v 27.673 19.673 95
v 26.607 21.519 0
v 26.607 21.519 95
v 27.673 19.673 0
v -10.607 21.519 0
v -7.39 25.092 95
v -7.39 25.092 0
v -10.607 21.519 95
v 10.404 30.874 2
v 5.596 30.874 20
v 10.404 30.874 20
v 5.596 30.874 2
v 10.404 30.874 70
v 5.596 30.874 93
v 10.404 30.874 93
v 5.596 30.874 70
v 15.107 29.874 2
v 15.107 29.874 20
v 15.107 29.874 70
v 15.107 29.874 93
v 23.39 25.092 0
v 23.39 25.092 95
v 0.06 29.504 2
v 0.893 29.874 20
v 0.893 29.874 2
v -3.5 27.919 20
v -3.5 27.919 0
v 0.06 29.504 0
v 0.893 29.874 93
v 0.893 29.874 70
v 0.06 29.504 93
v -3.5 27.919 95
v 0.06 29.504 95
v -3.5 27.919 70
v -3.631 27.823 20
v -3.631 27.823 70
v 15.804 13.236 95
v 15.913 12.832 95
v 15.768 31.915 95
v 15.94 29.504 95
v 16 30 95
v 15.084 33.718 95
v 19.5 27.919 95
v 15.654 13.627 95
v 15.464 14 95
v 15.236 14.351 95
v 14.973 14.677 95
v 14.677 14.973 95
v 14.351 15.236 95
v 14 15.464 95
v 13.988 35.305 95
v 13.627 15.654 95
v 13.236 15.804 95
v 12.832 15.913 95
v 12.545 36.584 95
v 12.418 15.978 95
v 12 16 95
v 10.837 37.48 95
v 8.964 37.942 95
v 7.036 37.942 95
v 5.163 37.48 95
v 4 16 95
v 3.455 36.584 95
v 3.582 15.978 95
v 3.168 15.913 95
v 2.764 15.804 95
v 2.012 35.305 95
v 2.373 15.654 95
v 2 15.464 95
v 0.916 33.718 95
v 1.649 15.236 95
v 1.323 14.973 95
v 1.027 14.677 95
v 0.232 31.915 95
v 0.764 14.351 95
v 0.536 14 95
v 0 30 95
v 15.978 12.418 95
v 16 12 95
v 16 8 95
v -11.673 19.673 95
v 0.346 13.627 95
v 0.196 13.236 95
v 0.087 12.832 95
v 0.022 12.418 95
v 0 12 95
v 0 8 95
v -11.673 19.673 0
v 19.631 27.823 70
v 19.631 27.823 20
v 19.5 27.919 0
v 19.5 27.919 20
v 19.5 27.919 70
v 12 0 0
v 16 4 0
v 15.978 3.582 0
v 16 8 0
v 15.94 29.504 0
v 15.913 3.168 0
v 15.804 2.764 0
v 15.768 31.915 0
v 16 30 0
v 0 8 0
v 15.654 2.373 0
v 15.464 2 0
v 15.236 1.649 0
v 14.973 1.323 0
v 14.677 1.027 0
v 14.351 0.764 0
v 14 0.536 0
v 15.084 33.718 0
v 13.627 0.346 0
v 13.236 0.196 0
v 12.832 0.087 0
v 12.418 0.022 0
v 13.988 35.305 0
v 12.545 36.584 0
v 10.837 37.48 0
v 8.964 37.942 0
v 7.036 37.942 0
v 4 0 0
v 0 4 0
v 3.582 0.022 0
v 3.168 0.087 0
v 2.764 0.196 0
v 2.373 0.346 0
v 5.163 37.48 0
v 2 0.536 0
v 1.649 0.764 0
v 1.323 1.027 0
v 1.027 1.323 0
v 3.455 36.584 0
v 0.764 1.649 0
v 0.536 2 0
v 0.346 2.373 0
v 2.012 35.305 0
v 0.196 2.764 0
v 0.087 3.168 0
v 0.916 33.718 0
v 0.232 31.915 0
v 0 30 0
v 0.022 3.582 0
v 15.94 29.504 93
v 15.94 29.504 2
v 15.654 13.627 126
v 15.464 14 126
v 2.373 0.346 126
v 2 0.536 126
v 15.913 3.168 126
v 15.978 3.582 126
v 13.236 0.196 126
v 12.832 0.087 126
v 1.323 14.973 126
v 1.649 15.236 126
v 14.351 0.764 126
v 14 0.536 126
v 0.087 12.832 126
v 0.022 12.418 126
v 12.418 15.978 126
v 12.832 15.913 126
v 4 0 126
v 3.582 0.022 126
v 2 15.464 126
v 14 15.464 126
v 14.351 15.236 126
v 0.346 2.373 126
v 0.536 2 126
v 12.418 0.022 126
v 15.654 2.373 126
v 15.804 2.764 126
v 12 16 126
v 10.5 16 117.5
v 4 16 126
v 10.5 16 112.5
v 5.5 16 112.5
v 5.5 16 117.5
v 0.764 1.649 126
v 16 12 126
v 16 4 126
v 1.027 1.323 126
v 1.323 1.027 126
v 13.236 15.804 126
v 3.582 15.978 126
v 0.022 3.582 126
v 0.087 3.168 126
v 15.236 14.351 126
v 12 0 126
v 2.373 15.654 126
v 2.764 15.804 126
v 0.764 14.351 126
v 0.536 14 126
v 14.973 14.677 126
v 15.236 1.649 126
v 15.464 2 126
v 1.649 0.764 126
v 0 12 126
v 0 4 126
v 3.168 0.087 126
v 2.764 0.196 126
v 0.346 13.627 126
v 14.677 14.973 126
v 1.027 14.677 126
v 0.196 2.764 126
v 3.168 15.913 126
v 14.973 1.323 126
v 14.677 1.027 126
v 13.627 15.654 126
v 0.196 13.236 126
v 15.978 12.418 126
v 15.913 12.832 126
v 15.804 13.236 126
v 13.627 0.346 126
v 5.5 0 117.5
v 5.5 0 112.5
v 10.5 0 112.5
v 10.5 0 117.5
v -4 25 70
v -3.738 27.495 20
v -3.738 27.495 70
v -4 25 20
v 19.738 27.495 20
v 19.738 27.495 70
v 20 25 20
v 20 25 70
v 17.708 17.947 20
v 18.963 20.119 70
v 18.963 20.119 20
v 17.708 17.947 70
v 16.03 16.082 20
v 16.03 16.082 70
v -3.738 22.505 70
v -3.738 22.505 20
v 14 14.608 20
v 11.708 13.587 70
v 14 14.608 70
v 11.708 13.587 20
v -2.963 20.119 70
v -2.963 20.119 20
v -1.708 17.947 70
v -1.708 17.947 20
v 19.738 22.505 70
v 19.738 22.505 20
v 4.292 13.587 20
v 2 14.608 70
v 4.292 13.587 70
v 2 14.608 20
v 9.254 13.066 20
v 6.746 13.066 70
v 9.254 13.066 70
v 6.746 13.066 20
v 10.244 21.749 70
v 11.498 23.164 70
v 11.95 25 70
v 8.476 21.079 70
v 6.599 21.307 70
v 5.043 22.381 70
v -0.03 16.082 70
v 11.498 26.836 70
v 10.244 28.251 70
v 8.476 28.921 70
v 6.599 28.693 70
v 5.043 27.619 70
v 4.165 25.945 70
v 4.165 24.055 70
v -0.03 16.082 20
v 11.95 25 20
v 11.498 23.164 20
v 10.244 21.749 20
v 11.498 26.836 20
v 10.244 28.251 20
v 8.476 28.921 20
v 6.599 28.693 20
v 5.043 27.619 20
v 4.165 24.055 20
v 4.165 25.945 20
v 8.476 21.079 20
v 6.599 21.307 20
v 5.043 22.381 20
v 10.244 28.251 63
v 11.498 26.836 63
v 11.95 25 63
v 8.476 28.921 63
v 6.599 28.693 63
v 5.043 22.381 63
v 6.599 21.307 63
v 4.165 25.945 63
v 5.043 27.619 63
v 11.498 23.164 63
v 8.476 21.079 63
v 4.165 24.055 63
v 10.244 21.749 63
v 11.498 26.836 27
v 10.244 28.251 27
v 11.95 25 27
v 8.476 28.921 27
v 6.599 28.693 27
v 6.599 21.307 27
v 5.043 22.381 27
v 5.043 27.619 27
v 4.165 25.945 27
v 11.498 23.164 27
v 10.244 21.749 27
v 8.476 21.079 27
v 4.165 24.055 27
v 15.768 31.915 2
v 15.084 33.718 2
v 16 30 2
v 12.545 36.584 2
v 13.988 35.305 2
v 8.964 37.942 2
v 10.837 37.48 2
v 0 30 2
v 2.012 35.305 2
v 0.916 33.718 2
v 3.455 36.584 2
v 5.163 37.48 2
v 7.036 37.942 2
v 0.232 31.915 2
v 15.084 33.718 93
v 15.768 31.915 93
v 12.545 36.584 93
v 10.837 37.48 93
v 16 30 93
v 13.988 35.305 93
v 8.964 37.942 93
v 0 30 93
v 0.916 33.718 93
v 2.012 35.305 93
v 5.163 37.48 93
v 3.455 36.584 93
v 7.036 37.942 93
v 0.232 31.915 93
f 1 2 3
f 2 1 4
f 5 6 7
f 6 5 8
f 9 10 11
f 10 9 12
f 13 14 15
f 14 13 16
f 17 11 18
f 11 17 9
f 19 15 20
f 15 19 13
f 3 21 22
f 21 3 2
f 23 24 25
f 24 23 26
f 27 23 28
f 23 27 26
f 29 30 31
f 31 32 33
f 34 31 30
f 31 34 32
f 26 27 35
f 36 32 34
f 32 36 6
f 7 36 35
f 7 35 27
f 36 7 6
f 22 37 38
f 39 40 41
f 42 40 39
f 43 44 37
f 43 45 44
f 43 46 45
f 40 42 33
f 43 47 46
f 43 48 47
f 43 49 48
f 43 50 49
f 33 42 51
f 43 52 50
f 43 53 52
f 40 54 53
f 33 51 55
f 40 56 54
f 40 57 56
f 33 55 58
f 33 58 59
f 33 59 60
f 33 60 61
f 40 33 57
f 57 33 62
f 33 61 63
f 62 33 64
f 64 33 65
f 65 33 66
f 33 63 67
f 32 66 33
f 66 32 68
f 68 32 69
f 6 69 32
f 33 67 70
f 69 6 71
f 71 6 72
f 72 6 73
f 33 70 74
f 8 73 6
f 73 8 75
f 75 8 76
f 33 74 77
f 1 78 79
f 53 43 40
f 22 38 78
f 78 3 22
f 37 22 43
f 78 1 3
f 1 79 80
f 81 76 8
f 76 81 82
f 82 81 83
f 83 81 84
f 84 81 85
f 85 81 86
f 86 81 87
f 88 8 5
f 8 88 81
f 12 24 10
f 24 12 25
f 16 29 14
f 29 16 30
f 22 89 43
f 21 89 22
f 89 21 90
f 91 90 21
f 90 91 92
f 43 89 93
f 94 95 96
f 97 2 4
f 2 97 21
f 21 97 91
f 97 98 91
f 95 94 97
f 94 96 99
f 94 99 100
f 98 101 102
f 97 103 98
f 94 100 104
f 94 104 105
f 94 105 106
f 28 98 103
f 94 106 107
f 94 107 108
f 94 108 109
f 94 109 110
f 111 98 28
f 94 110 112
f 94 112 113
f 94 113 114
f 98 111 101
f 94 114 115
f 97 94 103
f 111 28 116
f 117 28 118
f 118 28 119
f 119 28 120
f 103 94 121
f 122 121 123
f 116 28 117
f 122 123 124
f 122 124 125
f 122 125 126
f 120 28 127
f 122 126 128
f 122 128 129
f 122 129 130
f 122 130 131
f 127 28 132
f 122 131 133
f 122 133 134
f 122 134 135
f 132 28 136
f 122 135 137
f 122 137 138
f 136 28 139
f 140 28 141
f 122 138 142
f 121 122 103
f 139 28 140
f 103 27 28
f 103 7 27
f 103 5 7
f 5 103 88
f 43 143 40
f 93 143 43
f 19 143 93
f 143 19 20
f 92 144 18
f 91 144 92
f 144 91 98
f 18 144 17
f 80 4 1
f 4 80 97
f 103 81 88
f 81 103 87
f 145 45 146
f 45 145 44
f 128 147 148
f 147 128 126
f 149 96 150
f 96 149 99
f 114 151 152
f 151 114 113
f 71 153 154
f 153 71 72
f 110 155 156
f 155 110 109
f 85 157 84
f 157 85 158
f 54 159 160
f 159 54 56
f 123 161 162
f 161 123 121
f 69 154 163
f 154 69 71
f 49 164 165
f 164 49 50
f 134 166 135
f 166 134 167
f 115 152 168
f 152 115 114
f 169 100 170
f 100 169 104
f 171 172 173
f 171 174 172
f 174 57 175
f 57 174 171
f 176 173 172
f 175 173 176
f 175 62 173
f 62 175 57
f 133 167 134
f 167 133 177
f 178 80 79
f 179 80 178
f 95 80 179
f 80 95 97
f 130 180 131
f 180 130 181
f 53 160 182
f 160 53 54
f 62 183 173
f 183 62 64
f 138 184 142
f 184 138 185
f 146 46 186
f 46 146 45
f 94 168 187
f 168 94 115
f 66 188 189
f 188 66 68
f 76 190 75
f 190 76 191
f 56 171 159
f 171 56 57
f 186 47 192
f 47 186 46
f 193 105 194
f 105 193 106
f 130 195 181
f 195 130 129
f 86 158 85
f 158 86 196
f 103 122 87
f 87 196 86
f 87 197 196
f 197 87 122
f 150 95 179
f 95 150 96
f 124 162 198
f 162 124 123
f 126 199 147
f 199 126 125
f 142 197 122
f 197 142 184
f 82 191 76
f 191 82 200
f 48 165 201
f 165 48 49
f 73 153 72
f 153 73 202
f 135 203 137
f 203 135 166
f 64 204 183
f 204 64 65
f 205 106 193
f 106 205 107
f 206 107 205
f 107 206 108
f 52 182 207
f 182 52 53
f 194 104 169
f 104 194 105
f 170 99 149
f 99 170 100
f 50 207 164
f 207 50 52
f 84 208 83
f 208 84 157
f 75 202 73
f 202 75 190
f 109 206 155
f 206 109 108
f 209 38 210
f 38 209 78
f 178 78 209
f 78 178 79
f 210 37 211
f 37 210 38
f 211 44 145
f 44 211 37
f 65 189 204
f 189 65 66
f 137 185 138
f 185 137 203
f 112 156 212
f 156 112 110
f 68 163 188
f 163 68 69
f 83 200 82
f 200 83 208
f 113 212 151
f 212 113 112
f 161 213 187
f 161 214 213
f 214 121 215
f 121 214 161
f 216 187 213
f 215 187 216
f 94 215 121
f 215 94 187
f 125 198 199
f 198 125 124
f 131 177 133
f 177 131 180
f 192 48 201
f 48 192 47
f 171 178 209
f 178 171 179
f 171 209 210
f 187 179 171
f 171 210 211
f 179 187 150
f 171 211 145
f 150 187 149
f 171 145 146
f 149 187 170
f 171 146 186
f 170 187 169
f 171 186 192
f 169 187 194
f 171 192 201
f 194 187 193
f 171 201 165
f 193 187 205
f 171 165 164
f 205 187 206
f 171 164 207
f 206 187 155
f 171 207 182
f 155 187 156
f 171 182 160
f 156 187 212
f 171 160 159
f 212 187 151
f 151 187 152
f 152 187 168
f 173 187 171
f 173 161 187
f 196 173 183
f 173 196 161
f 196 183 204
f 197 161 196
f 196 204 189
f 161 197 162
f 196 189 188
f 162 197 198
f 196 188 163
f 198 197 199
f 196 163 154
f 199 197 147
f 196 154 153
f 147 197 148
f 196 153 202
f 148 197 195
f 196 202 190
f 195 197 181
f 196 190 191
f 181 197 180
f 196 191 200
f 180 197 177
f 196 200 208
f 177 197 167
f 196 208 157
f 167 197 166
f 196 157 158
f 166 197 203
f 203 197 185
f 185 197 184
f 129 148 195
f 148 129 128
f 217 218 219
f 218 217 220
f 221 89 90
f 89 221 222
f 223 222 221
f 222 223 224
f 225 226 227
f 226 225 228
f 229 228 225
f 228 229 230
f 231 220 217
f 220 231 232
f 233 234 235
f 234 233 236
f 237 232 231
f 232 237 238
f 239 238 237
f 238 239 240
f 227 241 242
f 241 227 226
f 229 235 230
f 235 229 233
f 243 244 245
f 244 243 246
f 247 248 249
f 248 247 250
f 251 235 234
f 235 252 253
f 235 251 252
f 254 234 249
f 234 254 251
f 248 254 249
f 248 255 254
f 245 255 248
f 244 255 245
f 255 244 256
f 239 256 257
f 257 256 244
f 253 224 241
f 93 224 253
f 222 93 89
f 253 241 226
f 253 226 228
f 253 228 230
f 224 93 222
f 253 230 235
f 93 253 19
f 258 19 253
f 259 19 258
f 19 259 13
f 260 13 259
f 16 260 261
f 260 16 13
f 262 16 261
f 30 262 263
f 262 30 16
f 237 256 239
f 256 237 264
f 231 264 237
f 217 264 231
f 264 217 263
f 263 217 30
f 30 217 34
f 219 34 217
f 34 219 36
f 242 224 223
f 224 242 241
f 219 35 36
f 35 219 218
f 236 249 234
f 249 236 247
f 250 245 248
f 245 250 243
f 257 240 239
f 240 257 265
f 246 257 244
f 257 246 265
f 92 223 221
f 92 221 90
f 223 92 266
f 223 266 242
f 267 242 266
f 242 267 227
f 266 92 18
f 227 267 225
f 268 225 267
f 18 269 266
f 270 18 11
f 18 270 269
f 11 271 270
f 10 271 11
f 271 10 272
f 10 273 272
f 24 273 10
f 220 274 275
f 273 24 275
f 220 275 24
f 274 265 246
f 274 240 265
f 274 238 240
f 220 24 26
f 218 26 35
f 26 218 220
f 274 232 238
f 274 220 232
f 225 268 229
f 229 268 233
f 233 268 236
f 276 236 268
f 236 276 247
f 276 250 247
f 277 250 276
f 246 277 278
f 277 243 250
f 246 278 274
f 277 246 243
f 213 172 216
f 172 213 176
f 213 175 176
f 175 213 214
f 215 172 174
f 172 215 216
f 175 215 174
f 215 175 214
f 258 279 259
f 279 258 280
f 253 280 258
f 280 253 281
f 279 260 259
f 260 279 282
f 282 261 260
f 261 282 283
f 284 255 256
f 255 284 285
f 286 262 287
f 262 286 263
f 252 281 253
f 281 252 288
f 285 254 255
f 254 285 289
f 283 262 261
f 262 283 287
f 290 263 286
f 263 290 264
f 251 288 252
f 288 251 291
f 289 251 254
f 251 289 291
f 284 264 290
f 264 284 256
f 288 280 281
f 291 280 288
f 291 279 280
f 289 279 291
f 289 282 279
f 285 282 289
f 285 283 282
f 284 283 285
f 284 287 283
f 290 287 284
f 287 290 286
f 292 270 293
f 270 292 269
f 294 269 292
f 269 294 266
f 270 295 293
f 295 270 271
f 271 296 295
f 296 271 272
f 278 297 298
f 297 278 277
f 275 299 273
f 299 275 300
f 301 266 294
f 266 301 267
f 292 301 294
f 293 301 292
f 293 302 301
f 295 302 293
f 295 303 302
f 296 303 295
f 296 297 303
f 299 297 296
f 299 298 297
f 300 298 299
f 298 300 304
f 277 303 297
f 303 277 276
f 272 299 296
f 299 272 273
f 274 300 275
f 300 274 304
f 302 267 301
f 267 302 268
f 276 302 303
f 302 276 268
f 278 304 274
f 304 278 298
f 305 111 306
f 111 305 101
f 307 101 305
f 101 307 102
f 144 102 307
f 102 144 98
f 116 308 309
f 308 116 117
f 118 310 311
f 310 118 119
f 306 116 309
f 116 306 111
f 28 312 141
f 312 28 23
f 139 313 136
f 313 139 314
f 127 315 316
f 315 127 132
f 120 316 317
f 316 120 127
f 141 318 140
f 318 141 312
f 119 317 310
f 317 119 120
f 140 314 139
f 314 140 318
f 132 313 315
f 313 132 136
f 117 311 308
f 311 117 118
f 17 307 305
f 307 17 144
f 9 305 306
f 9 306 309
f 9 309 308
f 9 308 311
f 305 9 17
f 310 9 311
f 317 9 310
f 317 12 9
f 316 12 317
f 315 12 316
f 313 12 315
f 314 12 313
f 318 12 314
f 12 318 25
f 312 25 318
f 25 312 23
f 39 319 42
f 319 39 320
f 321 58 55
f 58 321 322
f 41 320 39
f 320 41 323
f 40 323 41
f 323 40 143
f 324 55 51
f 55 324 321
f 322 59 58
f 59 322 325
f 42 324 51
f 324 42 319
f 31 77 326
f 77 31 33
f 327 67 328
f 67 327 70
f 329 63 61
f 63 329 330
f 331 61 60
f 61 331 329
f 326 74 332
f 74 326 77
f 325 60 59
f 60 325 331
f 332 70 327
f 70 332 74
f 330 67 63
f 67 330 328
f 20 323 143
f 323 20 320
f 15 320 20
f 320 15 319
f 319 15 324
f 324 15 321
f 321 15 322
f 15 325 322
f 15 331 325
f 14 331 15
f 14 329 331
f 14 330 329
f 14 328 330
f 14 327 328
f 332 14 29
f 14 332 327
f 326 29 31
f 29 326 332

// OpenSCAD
bearing_hole_diameter=7.9;
inner_cylinder_diameter=24;

union() {
  difference() {
    union() {
      base_roller();
      arc();
    }
    groove();
    pin_hole();
  }  
  bearing_mounts();
  tabs();
}

base_rect_size=16;

module pin_hole() {
  translate([base_rect_size/2,18,126-11])
    rotate([90,0,0])
      linear_extrude(20)
        square(5, true);
}

module tabs() {
  thick=2;
  linear_extrude(thick)
    translate([base_rect_size/2,30,0])
      circle(8);
  translate([0,0,95-thick])
    linear_extrude(thick)
      translate([base_rect_size/2,30,0])
        circle(8);
}

module bearing_mounts() {
  translate([base_rect_size/2,25,63])
    cylinder(d=bearing_hole_diameter,h=10);
  translate([base_rect_size/2,25,17])
    cylinder(d=bearing_hole_diameter,h=10);
}

module groove() {
  translate([base_rect_size/2,25,20]) 
    cylinder(d=inner_cylinder_diameter,h=50);
}

module arc() {
  radius=23;
  height=95;
  
  difference() {
    translate([base_rect_size/2,base_rect_size/2,0])
      cylinder(r=radius,h=height);
    
    linear_extrude(2000) {
      translate([base_rect_size/2,0,0])
        rotate([0,0,-45])
          square([100,100]);
      translate([base_rect_size/2,0,0])
        rotate([0,0,135])
          square([100,100]);
      translate([-50,-100,0])
        square([100,100]);
    }    
  }    
}

module base_roller() {  
  chamfer=4;  
  linear_extrude(126)
    translate([chamfer,chamfer,0])
      minkowski() {    
        square([base_rect_size-chamfer*2,base_rect_size-chamfer*2]);
        circle($fn=60,r=chamfer);
    }
  //square([base_rect_size,base_rect_size]);
}
